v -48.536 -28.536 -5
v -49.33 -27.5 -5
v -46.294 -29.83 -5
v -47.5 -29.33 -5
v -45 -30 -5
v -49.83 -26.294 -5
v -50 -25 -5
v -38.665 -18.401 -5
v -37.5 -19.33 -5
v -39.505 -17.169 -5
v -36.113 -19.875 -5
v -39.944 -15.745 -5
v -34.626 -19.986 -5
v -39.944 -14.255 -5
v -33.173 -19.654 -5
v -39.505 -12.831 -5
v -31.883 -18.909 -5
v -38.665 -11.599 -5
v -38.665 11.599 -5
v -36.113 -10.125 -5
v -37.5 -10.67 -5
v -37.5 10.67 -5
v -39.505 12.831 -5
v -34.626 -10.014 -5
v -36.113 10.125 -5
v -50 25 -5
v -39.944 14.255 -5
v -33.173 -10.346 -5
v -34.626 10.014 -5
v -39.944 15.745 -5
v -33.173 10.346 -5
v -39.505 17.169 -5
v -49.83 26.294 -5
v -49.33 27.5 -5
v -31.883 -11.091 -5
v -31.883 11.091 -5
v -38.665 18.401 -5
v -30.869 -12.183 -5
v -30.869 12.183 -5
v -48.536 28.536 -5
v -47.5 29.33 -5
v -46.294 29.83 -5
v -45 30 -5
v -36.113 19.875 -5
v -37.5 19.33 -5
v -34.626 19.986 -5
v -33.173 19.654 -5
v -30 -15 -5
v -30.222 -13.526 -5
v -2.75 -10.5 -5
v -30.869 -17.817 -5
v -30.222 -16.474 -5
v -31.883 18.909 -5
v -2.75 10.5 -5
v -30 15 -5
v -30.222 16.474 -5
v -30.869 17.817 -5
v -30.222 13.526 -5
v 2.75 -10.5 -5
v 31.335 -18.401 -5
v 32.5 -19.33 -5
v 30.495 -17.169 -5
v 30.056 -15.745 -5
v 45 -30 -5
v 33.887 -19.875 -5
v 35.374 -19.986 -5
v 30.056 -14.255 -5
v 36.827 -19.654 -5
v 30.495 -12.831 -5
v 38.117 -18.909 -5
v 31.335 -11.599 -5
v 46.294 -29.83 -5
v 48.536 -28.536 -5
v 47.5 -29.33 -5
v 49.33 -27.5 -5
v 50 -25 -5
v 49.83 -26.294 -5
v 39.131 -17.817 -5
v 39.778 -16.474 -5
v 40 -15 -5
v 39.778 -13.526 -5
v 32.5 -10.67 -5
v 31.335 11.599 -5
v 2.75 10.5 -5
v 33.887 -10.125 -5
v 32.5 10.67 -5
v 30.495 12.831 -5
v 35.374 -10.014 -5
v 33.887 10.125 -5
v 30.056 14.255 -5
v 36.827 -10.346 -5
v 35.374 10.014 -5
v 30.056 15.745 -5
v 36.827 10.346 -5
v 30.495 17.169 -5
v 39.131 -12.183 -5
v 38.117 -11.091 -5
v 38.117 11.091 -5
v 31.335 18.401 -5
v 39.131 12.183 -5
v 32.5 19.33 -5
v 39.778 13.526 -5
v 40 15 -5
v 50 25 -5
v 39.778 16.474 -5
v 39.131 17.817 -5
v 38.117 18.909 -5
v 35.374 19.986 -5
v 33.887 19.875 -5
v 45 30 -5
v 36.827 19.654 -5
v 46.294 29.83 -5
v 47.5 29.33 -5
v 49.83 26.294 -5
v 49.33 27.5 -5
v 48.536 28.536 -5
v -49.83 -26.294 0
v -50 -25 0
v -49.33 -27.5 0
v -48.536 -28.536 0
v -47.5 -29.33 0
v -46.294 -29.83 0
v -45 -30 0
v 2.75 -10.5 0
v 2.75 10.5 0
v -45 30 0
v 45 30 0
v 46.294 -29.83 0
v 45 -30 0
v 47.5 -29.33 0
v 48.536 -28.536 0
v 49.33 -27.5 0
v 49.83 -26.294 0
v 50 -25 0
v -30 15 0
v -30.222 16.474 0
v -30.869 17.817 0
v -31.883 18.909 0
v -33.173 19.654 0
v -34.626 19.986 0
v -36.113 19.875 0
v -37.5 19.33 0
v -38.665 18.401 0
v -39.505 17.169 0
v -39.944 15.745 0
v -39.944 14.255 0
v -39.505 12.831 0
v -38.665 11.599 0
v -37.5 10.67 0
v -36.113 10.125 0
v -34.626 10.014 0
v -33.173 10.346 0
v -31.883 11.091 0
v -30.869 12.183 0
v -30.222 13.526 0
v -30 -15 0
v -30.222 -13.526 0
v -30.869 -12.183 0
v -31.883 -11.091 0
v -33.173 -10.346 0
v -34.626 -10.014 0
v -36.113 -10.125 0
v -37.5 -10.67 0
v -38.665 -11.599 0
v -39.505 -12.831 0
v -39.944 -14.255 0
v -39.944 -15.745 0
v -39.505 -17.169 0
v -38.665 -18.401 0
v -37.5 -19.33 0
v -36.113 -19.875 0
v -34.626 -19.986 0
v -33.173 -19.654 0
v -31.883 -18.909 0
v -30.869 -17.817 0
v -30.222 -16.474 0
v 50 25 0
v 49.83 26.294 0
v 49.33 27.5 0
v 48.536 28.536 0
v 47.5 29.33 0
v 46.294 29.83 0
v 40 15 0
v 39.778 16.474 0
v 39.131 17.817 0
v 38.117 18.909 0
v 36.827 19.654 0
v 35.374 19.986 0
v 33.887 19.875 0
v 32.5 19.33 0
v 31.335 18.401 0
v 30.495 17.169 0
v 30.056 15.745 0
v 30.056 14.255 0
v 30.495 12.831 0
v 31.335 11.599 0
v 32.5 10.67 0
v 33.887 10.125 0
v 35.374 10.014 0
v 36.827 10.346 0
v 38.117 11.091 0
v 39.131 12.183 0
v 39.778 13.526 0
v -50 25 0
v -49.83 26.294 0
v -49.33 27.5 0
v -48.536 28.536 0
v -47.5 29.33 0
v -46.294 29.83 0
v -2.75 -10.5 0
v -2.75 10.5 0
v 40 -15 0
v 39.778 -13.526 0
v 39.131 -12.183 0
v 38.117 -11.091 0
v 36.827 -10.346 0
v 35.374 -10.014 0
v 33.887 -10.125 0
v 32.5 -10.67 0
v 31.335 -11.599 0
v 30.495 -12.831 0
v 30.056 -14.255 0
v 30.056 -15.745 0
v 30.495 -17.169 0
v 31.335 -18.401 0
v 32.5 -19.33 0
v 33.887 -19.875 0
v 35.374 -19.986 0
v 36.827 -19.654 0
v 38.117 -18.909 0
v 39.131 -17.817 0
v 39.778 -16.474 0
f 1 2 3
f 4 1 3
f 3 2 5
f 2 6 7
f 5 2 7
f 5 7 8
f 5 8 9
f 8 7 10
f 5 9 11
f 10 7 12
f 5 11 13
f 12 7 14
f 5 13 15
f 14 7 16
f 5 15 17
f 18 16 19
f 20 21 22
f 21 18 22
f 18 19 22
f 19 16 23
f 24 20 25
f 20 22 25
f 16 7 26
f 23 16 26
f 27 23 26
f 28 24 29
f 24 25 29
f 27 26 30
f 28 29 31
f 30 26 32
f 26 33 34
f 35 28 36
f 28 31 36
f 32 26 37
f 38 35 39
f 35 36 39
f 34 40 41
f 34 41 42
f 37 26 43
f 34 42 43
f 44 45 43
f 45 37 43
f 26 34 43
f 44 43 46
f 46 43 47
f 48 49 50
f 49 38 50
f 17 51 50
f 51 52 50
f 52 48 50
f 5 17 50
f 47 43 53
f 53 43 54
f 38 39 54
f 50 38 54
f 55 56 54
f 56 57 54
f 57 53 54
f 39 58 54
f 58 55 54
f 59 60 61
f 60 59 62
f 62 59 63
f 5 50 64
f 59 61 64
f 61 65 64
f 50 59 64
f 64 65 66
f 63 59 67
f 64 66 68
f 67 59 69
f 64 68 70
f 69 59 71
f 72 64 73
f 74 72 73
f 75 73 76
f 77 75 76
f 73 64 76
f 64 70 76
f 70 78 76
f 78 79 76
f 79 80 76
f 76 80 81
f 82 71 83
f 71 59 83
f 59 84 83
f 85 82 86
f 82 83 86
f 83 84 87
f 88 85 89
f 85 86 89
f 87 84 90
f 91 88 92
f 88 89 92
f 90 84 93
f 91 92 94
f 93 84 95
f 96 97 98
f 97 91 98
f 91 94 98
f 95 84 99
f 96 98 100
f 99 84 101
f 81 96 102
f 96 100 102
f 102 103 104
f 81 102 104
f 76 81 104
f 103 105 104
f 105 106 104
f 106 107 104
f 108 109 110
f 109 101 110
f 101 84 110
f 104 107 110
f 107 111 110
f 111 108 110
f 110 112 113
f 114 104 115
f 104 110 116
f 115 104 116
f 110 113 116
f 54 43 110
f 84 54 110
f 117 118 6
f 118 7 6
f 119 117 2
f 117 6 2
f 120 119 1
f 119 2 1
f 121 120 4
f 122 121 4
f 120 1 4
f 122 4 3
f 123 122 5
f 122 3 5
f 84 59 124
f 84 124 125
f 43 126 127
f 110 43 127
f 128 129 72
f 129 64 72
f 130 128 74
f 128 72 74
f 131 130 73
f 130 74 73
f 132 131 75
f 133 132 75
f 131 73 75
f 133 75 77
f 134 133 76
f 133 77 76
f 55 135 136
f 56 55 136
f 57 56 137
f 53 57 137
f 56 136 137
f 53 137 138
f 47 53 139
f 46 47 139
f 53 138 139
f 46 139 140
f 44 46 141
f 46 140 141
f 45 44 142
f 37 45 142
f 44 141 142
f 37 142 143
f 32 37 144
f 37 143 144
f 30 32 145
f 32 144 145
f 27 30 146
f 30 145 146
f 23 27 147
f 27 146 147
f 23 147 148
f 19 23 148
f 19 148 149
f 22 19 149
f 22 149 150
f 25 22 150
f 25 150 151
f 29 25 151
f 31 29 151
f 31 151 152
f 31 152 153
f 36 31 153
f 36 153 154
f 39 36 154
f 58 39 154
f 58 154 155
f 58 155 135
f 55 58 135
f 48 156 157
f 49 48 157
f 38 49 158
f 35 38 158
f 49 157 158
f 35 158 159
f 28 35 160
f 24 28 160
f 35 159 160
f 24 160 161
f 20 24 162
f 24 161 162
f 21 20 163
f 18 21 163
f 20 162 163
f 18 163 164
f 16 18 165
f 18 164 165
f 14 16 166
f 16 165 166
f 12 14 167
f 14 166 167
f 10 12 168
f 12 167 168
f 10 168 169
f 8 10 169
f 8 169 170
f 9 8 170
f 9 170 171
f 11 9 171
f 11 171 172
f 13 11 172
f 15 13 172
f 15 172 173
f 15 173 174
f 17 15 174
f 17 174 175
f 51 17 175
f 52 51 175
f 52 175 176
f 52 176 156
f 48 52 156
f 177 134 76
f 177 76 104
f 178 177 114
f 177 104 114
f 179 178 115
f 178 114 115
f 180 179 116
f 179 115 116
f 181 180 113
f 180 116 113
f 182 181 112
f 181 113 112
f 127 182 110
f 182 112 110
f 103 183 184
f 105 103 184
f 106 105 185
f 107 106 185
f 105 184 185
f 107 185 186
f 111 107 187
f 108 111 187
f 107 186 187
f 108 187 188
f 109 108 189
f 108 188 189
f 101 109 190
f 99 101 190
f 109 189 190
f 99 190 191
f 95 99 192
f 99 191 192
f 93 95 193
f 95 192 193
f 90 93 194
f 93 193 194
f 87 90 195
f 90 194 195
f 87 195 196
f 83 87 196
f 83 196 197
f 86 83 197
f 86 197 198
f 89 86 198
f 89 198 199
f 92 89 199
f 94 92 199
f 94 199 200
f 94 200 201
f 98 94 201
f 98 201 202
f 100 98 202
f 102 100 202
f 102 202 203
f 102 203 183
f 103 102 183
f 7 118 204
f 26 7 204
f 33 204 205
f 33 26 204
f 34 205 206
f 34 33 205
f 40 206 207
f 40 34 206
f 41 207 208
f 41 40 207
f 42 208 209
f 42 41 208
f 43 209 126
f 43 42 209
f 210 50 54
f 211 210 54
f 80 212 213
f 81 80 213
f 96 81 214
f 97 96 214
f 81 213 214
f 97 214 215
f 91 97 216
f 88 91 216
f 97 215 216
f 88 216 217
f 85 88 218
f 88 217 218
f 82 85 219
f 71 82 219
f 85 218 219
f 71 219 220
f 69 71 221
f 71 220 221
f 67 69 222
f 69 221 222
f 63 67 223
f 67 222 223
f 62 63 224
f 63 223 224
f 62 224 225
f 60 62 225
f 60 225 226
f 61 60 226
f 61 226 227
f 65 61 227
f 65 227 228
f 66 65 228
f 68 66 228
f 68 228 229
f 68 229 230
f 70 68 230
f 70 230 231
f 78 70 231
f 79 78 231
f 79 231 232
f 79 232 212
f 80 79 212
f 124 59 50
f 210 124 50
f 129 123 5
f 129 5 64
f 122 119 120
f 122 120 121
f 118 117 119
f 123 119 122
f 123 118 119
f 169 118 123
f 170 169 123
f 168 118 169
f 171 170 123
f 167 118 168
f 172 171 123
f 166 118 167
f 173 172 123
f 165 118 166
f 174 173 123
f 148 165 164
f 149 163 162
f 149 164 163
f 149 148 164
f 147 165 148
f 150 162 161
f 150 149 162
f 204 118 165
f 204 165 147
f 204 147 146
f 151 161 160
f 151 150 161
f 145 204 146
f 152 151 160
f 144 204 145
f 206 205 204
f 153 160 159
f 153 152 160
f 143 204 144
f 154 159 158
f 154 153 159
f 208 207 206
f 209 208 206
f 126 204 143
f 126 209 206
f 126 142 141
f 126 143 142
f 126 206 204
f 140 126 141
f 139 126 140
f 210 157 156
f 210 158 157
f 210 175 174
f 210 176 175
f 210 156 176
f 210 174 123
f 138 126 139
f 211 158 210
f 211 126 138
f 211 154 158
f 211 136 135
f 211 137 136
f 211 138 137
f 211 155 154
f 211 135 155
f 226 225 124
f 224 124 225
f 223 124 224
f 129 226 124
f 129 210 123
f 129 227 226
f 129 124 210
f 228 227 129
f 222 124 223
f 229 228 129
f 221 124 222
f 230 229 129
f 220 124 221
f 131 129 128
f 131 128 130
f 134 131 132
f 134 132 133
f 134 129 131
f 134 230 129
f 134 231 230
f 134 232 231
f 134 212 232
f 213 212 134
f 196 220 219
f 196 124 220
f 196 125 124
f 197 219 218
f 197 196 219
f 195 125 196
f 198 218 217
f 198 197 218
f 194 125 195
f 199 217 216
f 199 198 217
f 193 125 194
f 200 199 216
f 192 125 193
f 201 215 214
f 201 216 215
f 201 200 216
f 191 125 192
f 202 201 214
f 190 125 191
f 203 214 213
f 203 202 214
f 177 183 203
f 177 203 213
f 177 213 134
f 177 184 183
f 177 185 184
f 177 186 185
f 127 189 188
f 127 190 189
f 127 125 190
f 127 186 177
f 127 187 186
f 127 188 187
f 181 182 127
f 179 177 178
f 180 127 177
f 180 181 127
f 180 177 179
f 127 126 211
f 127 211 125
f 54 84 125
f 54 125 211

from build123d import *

# Parameters (mm, degrees)
IZIM1_W               = 100
IZIM1_H               = 60
TABAN_FLAN_1_DEPTH    = 5
RADYUS1_R             = 5
IZIM6_R               = 5
KES_EKSTR_ZYON1_DEPTH = 10
IZIM7_W               = 5.5
IZIM7_H               = 21
KES_EKSTR_ZYON2_DEPTH = 10


# Sheet-metal steps are written as plain solids
with BuildPart() as part:
    # Çizim1 → Taban-Flanş1 (new body)
    with BuildSketch(Plane.XY):
        Rectangle(IZIM1_W, IZIM1_H)
    extrude(amount=-TABAN_FLAN_1_DEPTH)

    # Radyus1
    radyus1_edges = [part.edges().sort_by_distance(p)[0] for p in [
        (50, -30, -2.5),
        (-50, -30, -2.5),
        (-50, 30, -2.5),
        (50, 30, -2.5),
    ]]
    fillet(radyus1_edges, radius=RADYUS1_R)

    # Çizim6 → Kes-Ekstrüzyon1 (cut)
    with BuildSketch(Plane.XY):
        with Locations((-35, 15)):
            Circle(IZIM6_R)
        with Locations((-35, -15)):
            Circle(IZIM6_R)
        with Locations((35, 15)):
            Circle(IZIM6_R)
        with Locations((35, -15)):
            Circle(IZIM6_R)
    extrude(amount=-KES_EKSTR_ZYON1_DEPTH, mode=Mode.SUBTRACT)

    # Çizim7 → Kes-Ekstrüzyon2 (cut)
    with BuildSketch(Plane(origin=(0, 0, -5), x_dir=(-1, 0, 0), z_dir=(0, 0, -1))):
        Rectangle(IZIM7_W, IZIM7_H)
    extrude(amount=-KES_EKSTR_ZYON2_DEPTH, mode=Mode.SUBTRACT)


solid = part.part
